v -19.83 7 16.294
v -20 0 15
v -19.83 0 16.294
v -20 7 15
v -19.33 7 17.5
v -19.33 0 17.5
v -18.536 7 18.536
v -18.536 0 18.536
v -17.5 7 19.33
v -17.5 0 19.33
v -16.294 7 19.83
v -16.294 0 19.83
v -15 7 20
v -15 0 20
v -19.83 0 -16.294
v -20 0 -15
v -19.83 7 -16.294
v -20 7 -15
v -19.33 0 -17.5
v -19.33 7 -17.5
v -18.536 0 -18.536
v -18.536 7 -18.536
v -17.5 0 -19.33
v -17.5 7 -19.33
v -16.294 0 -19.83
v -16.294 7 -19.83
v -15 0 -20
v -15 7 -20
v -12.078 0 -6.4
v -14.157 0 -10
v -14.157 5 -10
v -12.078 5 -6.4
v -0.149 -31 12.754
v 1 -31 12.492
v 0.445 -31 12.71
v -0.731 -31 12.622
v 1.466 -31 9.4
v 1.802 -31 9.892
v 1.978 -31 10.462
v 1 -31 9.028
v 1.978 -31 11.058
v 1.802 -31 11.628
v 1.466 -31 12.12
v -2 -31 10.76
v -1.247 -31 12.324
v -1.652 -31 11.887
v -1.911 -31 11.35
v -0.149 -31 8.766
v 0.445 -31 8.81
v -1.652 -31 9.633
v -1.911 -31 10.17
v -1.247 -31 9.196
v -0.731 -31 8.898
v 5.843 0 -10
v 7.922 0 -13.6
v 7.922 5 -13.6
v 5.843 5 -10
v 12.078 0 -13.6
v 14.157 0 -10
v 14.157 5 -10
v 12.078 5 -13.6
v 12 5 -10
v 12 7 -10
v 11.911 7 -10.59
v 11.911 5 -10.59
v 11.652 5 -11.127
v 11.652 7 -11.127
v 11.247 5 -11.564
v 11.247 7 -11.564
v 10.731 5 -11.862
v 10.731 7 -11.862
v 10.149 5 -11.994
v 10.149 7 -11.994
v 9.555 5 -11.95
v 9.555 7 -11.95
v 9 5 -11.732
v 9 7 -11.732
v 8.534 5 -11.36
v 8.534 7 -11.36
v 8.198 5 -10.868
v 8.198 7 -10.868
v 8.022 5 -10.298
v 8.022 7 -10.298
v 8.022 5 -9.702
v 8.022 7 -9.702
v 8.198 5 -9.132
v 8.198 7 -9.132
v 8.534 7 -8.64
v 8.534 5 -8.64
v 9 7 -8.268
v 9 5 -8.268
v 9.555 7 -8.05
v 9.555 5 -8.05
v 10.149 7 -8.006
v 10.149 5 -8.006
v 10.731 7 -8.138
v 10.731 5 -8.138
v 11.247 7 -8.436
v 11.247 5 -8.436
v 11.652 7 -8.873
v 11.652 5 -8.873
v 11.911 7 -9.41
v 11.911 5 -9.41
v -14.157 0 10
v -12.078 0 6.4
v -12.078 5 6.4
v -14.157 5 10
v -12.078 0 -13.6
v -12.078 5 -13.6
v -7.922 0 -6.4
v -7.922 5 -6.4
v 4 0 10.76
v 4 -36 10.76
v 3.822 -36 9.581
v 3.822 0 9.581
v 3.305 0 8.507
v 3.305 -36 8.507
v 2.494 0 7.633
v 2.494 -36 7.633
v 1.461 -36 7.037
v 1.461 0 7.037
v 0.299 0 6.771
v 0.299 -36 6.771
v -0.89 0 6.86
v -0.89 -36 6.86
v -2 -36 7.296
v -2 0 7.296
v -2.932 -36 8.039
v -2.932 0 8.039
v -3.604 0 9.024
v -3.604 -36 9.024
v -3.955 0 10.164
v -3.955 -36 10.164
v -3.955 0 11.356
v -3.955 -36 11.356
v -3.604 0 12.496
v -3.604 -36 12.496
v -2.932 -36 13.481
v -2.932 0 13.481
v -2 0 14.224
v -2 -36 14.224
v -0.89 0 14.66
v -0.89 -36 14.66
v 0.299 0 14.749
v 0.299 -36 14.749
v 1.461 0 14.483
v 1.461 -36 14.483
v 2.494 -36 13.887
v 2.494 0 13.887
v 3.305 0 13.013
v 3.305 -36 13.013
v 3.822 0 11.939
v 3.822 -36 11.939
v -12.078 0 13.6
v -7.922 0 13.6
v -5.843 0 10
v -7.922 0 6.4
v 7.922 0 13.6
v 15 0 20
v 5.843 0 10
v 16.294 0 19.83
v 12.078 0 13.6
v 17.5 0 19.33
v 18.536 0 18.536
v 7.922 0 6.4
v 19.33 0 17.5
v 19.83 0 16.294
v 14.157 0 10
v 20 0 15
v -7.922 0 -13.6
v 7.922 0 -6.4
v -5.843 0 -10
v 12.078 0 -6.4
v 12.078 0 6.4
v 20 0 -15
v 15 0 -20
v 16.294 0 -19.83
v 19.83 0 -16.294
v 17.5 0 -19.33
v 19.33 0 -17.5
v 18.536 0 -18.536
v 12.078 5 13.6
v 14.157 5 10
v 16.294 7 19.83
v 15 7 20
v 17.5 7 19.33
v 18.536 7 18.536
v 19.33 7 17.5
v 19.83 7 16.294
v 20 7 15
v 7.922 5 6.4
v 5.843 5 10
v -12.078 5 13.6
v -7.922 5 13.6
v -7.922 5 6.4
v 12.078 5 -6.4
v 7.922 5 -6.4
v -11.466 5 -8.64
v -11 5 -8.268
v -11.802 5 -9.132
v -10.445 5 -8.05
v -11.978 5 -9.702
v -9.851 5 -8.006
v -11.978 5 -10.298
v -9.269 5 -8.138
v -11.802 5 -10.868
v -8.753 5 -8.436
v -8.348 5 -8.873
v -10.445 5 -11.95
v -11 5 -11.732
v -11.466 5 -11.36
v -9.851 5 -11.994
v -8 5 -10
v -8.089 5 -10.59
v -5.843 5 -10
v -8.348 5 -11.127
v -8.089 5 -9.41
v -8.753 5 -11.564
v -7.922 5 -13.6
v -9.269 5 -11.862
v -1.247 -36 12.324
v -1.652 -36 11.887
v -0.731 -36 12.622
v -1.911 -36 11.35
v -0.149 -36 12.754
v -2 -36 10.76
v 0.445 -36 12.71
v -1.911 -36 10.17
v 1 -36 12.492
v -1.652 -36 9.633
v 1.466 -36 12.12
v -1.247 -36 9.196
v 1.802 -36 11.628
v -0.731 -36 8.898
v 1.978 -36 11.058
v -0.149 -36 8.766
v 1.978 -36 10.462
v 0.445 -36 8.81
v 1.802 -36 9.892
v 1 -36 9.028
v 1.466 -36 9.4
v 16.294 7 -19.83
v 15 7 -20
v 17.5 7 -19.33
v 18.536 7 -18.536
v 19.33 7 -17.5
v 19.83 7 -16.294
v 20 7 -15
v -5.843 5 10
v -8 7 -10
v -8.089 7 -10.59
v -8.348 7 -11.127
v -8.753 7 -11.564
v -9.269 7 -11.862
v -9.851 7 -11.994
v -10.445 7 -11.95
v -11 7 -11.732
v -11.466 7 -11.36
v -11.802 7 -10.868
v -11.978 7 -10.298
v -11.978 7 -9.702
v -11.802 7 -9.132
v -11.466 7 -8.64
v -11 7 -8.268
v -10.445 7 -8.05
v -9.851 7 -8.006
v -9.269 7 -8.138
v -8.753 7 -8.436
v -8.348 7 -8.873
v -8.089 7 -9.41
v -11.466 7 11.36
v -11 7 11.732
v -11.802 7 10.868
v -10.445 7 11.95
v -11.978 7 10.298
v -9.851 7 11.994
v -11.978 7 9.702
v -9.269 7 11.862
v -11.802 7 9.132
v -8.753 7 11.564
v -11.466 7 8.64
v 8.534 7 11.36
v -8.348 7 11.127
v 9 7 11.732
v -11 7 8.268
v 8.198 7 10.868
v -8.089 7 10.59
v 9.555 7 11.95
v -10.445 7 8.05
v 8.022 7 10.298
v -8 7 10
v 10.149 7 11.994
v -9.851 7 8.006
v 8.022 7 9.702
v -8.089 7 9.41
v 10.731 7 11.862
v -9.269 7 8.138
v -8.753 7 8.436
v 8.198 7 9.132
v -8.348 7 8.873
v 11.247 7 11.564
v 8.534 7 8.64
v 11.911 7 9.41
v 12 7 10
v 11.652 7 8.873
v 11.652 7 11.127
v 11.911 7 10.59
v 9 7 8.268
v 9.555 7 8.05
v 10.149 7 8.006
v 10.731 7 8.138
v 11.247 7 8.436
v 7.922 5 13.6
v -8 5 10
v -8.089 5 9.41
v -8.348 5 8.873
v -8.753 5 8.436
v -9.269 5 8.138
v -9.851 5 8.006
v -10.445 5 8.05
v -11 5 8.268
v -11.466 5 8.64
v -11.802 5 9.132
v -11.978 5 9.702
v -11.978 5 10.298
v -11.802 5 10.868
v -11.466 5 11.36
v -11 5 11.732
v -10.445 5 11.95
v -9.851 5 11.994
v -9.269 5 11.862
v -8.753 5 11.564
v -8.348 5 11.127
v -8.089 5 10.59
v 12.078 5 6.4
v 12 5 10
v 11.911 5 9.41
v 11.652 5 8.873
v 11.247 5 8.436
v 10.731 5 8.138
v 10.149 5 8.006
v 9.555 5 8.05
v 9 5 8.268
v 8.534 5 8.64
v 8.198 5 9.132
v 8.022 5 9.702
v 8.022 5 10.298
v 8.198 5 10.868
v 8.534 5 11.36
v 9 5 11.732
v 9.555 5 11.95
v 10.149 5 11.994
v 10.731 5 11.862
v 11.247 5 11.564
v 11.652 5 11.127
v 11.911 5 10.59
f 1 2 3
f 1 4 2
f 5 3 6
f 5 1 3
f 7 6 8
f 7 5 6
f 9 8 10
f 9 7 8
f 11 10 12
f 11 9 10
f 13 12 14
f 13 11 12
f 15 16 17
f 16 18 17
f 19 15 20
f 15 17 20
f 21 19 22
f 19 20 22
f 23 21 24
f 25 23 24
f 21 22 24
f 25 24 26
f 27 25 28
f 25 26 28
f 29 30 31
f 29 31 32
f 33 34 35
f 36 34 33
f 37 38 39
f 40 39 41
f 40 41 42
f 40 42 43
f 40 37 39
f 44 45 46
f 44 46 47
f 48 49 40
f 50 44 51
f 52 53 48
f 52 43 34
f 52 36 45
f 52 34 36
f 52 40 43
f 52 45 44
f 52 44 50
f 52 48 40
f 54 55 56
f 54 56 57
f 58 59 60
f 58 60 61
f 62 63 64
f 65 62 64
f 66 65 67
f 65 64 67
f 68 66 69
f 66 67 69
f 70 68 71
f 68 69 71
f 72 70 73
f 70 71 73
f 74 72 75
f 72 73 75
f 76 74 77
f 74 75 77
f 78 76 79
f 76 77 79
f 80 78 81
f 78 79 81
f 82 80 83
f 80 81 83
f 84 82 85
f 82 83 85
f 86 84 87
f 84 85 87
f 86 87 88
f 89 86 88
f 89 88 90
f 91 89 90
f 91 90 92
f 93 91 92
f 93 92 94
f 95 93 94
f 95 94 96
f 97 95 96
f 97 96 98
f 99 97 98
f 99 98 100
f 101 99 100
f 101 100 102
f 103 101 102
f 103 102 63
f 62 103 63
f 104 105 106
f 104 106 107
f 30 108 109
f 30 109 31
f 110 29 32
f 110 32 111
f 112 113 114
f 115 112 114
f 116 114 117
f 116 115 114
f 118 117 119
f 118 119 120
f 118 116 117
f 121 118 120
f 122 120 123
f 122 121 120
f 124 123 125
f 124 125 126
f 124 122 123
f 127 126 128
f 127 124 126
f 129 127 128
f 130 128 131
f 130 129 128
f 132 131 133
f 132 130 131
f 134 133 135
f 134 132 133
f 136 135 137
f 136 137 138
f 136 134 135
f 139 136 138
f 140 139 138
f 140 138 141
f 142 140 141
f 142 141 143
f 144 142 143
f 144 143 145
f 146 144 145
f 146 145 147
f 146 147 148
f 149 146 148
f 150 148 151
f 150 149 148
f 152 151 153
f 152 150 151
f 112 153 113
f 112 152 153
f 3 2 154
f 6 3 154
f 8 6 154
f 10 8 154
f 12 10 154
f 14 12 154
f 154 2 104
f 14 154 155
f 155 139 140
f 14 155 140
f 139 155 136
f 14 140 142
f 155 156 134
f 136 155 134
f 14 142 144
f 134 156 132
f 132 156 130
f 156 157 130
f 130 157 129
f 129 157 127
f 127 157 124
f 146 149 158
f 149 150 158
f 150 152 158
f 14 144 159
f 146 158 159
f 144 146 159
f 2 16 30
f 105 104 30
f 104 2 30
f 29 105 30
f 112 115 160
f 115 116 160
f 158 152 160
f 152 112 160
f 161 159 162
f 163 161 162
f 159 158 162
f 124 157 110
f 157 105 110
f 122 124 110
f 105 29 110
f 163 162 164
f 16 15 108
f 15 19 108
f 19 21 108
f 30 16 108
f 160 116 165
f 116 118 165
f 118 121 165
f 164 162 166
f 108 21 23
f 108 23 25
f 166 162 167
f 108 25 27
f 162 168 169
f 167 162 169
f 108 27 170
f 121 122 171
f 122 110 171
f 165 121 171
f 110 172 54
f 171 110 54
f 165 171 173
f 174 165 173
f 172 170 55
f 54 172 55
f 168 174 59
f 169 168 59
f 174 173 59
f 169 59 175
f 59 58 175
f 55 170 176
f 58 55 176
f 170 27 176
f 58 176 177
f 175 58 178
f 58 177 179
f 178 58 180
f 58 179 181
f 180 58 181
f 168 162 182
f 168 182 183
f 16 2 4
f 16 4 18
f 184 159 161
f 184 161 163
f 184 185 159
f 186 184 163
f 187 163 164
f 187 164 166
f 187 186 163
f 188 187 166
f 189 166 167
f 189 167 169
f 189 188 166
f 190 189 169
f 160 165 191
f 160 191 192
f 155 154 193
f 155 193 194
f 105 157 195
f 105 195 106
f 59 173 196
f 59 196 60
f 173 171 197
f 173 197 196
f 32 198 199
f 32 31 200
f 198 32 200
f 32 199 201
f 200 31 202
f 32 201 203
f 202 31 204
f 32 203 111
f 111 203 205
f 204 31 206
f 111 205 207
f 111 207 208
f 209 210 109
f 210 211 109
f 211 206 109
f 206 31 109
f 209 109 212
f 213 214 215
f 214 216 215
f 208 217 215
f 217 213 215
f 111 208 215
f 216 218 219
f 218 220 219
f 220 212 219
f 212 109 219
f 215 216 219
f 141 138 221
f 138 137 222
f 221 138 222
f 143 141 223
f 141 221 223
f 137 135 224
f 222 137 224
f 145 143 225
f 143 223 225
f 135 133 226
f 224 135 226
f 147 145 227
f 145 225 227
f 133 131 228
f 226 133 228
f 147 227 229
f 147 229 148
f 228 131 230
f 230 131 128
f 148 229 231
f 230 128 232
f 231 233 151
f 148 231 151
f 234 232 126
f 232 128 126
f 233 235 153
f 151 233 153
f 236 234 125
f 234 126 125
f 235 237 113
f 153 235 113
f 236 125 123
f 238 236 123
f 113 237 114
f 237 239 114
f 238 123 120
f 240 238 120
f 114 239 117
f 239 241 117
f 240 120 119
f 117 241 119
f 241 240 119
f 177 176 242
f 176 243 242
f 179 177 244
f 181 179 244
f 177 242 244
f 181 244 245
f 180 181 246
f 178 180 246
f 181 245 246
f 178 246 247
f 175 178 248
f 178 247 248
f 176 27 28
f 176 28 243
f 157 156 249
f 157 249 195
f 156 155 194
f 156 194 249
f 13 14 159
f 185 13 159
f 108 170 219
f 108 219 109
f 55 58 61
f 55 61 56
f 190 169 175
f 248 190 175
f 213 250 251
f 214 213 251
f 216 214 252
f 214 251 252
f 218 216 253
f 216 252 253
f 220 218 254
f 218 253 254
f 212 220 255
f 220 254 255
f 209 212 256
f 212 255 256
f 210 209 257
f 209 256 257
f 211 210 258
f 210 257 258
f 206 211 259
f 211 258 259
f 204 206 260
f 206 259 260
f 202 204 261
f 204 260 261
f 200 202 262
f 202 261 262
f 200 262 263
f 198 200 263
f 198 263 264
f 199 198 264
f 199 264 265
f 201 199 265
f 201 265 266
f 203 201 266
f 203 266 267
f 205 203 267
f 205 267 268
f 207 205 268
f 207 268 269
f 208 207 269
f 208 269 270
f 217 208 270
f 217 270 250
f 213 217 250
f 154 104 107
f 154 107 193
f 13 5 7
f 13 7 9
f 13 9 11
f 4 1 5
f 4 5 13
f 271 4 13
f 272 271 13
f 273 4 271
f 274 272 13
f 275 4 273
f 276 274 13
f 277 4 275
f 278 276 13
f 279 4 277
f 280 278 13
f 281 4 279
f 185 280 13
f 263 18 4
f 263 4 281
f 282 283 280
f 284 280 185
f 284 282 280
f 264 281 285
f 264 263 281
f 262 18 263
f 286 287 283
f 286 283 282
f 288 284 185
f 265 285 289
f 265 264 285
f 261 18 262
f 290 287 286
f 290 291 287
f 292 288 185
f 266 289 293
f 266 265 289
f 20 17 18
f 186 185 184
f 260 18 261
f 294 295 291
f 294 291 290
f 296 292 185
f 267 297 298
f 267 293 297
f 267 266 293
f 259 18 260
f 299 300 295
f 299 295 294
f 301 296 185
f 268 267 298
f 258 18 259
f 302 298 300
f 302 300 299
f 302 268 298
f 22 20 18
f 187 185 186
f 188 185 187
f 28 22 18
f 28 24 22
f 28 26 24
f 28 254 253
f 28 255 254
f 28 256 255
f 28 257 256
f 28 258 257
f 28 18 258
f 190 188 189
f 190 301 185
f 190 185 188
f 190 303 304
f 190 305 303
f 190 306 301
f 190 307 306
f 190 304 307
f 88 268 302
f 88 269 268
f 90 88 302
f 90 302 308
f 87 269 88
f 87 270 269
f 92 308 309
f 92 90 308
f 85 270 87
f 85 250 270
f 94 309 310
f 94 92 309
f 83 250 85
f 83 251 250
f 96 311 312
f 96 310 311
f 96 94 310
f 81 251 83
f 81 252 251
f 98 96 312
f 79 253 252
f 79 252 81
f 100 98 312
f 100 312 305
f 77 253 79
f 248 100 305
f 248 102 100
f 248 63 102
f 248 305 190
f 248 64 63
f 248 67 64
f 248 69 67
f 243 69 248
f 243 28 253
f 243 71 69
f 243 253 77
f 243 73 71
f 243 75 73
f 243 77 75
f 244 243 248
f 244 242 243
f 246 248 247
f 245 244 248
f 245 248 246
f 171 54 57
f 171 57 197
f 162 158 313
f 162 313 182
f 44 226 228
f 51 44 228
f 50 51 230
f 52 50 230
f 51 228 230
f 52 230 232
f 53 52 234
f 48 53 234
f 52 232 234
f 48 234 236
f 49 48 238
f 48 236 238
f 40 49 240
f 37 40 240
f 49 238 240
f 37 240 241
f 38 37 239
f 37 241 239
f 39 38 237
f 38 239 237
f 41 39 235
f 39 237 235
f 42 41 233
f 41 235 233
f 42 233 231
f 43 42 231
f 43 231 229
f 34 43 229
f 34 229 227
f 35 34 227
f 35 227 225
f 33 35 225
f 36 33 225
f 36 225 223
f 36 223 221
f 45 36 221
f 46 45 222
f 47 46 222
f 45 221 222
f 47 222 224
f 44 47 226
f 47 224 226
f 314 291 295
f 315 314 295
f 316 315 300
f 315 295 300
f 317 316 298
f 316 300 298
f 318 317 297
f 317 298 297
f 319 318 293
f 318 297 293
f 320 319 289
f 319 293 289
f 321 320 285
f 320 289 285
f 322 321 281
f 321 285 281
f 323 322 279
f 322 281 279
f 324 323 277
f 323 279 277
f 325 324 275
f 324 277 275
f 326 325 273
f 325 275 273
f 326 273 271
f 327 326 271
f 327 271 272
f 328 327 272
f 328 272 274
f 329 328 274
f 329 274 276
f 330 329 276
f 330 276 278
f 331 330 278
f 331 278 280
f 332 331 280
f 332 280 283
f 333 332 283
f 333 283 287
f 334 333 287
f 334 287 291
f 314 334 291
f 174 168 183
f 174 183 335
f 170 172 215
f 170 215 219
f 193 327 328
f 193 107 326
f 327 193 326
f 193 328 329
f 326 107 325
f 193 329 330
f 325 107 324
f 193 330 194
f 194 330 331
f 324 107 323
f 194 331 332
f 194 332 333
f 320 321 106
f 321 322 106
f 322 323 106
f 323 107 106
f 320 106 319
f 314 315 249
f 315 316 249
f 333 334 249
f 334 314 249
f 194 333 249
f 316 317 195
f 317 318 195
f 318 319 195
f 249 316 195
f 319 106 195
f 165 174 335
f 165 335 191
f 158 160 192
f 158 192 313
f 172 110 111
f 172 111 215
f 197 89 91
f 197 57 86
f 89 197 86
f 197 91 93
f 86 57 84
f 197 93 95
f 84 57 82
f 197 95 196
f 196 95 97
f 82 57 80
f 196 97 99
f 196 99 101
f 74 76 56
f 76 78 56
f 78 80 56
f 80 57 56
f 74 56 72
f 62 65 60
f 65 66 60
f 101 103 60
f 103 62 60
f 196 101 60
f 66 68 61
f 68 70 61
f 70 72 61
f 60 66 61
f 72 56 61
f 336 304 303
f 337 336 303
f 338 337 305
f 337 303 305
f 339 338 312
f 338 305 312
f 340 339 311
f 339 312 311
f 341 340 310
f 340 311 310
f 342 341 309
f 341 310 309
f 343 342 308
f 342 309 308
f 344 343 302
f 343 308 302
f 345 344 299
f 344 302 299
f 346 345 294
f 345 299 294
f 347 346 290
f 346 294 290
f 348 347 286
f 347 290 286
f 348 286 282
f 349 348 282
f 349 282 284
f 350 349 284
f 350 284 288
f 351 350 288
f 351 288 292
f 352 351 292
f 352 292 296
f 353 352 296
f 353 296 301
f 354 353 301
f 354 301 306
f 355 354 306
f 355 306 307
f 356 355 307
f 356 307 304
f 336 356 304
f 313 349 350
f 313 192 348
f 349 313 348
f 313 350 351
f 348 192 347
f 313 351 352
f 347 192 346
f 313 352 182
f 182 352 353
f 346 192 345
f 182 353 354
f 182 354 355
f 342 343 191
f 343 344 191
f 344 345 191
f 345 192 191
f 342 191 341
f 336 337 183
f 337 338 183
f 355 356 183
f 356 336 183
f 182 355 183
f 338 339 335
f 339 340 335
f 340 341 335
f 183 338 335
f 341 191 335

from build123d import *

# Parameters (mm, degrees)
SKETCH1_W           = 40
SKETCH1_H           = 40
BOSS_EXTRUDE1_DEPTH = 7
SKETCH3_R           = 2
CUT_EXTRUDE2_DEPTH  = 8
FILLET1_R           = 5
CUT_EXTRUDE7_DEPTH  = 5
SKETCH4_R           = 4
BOSS_EXTRUDE2_DEPTH = 36
SKETCH5_R           = 2
CUT_EXTRUDE8_DEPTH  = 5


with BuildPart() as part:
    # Sketch1 → Boss-Extrude1 (new body)
    with BuildSketch(Plane(origin=(0, 0, 0), x_dir=(1, 0, 0), z_dir=(0, 1, 0))):
        Rectangle(SKETCH1_W, SKETCH1_H)
    extrude(amount=BOSS_EXTRUDE1_DEPTH)

    # Sketch3 → Cut-Extrude2 (cut, through all)
    with BuildSketch(Plane(origin=(0, 7, 0), x_dir=(1, 0, 0), z_dir=(0, 1, 0))):
        with Locations((-10, 10)):
            Circle(SKETCH3_R)
        with Locations((10, 10)):
            Circle(SKETCH3_R)
        with Locations((-10, -10)):
            Circle(SKETCH3_R)
        with Locations((10, -10)):
            Circle(SKETCH3_R)
    extrude(amount=-CUT_EXTRUDE2_DEPTH, mode=Mode.SUBTRACT)

    # Fillet1
    fillet1_edges = [part.edges().sort_by_distance(p)[0] for p in [
        (20, 3.5, 20),
        (-20, 3.5, 20),
        (-20, 3.5, -20),
        (20, 3.5, -20),
    ]]
    fillet(fillet1_edges, radius=FILLET1_R)

    # Sketch2 → Cut-Extrude7 (cut)
    with BuildSketch(Plane(origin=(0, 0, 0), x_dir=(1, 0, 0), z_dir=(0, 1, 0))):
        Polygon((-5.843078062, -10), (-10, -10), (-10, -6.4), (-12.078460969, -6.4), (-14.156921938, -10), (-12.078460969, -13.6), (-7.921539031, -13.6), align=None)
        Polygon((10, -10), (5.843078062, -10), (7.921539031, -13.6), (12.078460969, -13.6), (14.156921938, -10), (12.078460969, -6.4), (10, -6.4), align=None)
        Polygon((7.921539031, -6.4), (5.843078062, -10), (10, -10), (10, -6.4), align=None)
        Polygon((-10, -6.4), (-10, -10), (-5.843078062, -10), (-7.921539031, -6.4), align=None)
        Polygon((-12.078460969, 6.4), (-10, 6.4), (-10, 10), (-5.843078062, 10), (-7.921539031, 13.6), (-12.078460969, 13.6), (-14.156921938, 10), align=None)
        Polygon((-10, 10), (-10, 6.4), (-7.921539031, 6.4), (-5.843078062, 10), align=None)
        Polygon((7.921539031, 6.4), (10, 6.4), (10, 10), (5.843078062, 10), align=None)
        Polygon((10, 10), (10, 6.4), (12.078460969, 6.4), (14.156921938, 10), (12.078460969, 13.6), (7.921539031, 13.6), (5.843078062, 10), align=None)
    extrude(amount=CUT_EXTRUDE7_DEPTH, mode=Mode.SUBTRACT)

    # Sketch4 → Boss-Extrude2 (add)
    with BuildSketch(Plane(origin=(0, 0, 0), x_dir=(1, 0, 0), z_dir=(0, 1, 0))):
        with Locations((0, -10.76)):
            Circle(SKETCH4_R)
    extrude(amount=-BOSS_EXTRUDE2_DEPTH)

    # Sketch5 → Cut-Extrude8 (cut)
    with BuildSketch(Plane(origin=(0, -36, 0), x_dir=(-1, 0, 0), z_dir=(0, -1, 0))):
        with Locations((0, -10.76)):
            Circle(SKETCH5_R)
    extrude(amount=-CUT_EXTRUDE8_DEPTH, mode=Mode.SUBTRACT)


solid = part.part
